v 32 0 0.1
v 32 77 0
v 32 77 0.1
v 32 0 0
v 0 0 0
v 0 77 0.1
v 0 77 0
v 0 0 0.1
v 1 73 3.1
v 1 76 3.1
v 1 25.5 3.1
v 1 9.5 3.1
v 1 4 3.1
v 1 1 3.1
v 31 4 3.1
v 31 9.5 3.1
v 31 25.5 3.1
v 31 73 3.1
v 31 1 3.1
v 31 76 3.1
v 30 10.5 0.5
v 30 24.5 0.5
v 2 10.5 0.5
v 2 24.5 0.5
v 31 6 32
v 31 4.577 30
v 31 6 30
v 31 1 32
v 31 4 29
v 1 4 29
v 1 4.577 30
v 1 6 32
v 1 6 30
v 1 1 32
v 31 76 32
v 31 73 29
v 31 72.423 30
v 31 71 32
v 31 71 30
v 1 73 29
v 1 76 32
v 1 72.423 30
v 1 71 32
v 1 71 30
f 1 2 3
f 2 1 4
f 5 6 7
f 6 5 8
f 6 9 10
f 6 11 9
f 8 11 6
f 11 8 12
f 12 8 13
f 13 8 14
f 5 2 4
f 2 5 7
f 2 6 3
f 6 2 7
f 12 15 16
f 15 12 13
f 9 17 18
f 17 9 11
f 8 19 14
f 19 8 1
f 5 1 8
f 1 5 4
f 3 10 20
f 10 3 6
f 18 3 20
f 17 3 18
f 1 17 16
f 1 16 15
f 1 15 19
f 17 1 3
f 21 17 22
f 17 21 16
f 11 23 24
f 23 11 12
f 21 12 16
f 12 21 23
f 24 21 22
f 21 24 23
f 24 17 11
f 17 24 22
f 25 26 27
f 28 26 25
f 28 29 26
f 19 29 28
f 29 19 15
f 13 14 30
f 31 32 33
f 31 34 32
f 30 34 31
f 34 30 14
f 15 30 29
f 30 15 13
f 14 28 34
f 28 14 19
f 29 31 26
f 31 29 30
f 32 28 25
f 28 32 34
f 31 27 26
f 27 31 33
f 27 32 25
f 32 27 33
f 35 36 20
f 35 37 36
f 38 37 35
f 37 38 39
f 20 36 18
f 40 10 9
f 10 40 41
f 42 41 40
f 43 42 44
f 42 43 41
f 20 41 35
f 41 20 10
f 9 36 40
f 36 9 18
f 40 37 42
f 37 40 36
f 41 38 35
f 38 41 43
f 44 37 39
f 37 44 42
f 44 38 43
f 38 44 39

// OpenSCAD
// Base Config
base_W = 23.5;
base_H = 24;
base_T = 0.5;
default_T = 2.0;
default_S = 12;
// $fn = 60; // When this line comment out, my pc was stoped.
// Ring Config
ring_H = 10;
ring_base_R = 24;
ring_base_W = 6;
minkowski_R = 2;

difference() {
    hull(){
        translate([0, 0, 0]) cube([32, 77, 0.1]);
        translate([1, 1, 3]) cube([30, 75, 0.1]);
    }
    hull(){
        translate([2, 10.5, 0.5]) cube([28, 14, 0.1]);
        translate([1, 9.5, 3.1]) cube([30, 16, 0.1]);
    }
}

translate([1, 1, 0]) cube([30, 3, 30.5]);
translate([1, 4, 30]) rotate([0, 90, 0]) cylinder(h=30, r=1, center=false, $fn=3);
translate([1, 1, 30]) cube([30, 5, 2]);


translate([1, 73, 0]) cube([30, 3, 30.5]);
translate([1, 73, 30]) rotate([0, 90, 0]) cylinder(h=30, r=1, center=false, $fn=3);
translate([1, 71, 30]) cube([30, 5, 2]);

// base block
//staple_base(base_T,base_W,base_H,default_S,default_T);
// hull(){
//     translate([1, 16, default_T]) cube([base_W - 2, 26, default_T]);
//     translate([1, 17, default_T * 2]) cube([base_W - 2, 20, default_T]);
// }
// Ring block
// translate([11.75, 32, 35]) {
//     rotate([90, 180, 0]) {
//         // Ring part
//         translate([0, 0, minkowski_R]) {
//             minkowski() {
//                 difference() {
//                     cylinder(h = ring_H, r = ring_base_R + ring_base_W);
//                     union() {
//                         cylinder(h = ring_H, r1 = ring_base_R, r2 = ring_base_R + (ring_base_W / 2));
//                         translate([-12.5, -33, 0]) cube(25);
//                     }
//                 }
//                 sphere(minkowski_R);
//             }
//         }
//     }
// }

module stapler_area(bt,bw,ds,dt) {
    hull() {
        translate([0, 0, dt - bt]) cube([bw - dt, ds + 2, 0.1]);
        translate([1, 1, 0]) cube([bw - dt * 2, ds, 0.1]);
    }
}

module staple_base(bt,bw,bh,ds,dt) {
    union() {
        // Base1(Bottom)
        cube([bw, bh, bt]);
        // Base2(Top)
        translate([0, 0, bt]) {
            difference() {
                // Base2_body
                hull() {
                    translate([1, 1, dt - bt]) cube([bw - 2, bh - 2, 0.1]);
                    translate([0, 0, 0]) cube([bw, bh, 0.1]);
                }
                // Base2_stapler_area1(Top)
                # translate([dt - 1, dt - 1, 0]) stapler_area(bt,bw,ds,dt);
                // Base2_stapler_area2(Bottom)
                # translate([dt - 1, bh - ds - dt - 1, 0]) stapler_area(bt,bw,ds,dt);
            }
        }
    }
}
